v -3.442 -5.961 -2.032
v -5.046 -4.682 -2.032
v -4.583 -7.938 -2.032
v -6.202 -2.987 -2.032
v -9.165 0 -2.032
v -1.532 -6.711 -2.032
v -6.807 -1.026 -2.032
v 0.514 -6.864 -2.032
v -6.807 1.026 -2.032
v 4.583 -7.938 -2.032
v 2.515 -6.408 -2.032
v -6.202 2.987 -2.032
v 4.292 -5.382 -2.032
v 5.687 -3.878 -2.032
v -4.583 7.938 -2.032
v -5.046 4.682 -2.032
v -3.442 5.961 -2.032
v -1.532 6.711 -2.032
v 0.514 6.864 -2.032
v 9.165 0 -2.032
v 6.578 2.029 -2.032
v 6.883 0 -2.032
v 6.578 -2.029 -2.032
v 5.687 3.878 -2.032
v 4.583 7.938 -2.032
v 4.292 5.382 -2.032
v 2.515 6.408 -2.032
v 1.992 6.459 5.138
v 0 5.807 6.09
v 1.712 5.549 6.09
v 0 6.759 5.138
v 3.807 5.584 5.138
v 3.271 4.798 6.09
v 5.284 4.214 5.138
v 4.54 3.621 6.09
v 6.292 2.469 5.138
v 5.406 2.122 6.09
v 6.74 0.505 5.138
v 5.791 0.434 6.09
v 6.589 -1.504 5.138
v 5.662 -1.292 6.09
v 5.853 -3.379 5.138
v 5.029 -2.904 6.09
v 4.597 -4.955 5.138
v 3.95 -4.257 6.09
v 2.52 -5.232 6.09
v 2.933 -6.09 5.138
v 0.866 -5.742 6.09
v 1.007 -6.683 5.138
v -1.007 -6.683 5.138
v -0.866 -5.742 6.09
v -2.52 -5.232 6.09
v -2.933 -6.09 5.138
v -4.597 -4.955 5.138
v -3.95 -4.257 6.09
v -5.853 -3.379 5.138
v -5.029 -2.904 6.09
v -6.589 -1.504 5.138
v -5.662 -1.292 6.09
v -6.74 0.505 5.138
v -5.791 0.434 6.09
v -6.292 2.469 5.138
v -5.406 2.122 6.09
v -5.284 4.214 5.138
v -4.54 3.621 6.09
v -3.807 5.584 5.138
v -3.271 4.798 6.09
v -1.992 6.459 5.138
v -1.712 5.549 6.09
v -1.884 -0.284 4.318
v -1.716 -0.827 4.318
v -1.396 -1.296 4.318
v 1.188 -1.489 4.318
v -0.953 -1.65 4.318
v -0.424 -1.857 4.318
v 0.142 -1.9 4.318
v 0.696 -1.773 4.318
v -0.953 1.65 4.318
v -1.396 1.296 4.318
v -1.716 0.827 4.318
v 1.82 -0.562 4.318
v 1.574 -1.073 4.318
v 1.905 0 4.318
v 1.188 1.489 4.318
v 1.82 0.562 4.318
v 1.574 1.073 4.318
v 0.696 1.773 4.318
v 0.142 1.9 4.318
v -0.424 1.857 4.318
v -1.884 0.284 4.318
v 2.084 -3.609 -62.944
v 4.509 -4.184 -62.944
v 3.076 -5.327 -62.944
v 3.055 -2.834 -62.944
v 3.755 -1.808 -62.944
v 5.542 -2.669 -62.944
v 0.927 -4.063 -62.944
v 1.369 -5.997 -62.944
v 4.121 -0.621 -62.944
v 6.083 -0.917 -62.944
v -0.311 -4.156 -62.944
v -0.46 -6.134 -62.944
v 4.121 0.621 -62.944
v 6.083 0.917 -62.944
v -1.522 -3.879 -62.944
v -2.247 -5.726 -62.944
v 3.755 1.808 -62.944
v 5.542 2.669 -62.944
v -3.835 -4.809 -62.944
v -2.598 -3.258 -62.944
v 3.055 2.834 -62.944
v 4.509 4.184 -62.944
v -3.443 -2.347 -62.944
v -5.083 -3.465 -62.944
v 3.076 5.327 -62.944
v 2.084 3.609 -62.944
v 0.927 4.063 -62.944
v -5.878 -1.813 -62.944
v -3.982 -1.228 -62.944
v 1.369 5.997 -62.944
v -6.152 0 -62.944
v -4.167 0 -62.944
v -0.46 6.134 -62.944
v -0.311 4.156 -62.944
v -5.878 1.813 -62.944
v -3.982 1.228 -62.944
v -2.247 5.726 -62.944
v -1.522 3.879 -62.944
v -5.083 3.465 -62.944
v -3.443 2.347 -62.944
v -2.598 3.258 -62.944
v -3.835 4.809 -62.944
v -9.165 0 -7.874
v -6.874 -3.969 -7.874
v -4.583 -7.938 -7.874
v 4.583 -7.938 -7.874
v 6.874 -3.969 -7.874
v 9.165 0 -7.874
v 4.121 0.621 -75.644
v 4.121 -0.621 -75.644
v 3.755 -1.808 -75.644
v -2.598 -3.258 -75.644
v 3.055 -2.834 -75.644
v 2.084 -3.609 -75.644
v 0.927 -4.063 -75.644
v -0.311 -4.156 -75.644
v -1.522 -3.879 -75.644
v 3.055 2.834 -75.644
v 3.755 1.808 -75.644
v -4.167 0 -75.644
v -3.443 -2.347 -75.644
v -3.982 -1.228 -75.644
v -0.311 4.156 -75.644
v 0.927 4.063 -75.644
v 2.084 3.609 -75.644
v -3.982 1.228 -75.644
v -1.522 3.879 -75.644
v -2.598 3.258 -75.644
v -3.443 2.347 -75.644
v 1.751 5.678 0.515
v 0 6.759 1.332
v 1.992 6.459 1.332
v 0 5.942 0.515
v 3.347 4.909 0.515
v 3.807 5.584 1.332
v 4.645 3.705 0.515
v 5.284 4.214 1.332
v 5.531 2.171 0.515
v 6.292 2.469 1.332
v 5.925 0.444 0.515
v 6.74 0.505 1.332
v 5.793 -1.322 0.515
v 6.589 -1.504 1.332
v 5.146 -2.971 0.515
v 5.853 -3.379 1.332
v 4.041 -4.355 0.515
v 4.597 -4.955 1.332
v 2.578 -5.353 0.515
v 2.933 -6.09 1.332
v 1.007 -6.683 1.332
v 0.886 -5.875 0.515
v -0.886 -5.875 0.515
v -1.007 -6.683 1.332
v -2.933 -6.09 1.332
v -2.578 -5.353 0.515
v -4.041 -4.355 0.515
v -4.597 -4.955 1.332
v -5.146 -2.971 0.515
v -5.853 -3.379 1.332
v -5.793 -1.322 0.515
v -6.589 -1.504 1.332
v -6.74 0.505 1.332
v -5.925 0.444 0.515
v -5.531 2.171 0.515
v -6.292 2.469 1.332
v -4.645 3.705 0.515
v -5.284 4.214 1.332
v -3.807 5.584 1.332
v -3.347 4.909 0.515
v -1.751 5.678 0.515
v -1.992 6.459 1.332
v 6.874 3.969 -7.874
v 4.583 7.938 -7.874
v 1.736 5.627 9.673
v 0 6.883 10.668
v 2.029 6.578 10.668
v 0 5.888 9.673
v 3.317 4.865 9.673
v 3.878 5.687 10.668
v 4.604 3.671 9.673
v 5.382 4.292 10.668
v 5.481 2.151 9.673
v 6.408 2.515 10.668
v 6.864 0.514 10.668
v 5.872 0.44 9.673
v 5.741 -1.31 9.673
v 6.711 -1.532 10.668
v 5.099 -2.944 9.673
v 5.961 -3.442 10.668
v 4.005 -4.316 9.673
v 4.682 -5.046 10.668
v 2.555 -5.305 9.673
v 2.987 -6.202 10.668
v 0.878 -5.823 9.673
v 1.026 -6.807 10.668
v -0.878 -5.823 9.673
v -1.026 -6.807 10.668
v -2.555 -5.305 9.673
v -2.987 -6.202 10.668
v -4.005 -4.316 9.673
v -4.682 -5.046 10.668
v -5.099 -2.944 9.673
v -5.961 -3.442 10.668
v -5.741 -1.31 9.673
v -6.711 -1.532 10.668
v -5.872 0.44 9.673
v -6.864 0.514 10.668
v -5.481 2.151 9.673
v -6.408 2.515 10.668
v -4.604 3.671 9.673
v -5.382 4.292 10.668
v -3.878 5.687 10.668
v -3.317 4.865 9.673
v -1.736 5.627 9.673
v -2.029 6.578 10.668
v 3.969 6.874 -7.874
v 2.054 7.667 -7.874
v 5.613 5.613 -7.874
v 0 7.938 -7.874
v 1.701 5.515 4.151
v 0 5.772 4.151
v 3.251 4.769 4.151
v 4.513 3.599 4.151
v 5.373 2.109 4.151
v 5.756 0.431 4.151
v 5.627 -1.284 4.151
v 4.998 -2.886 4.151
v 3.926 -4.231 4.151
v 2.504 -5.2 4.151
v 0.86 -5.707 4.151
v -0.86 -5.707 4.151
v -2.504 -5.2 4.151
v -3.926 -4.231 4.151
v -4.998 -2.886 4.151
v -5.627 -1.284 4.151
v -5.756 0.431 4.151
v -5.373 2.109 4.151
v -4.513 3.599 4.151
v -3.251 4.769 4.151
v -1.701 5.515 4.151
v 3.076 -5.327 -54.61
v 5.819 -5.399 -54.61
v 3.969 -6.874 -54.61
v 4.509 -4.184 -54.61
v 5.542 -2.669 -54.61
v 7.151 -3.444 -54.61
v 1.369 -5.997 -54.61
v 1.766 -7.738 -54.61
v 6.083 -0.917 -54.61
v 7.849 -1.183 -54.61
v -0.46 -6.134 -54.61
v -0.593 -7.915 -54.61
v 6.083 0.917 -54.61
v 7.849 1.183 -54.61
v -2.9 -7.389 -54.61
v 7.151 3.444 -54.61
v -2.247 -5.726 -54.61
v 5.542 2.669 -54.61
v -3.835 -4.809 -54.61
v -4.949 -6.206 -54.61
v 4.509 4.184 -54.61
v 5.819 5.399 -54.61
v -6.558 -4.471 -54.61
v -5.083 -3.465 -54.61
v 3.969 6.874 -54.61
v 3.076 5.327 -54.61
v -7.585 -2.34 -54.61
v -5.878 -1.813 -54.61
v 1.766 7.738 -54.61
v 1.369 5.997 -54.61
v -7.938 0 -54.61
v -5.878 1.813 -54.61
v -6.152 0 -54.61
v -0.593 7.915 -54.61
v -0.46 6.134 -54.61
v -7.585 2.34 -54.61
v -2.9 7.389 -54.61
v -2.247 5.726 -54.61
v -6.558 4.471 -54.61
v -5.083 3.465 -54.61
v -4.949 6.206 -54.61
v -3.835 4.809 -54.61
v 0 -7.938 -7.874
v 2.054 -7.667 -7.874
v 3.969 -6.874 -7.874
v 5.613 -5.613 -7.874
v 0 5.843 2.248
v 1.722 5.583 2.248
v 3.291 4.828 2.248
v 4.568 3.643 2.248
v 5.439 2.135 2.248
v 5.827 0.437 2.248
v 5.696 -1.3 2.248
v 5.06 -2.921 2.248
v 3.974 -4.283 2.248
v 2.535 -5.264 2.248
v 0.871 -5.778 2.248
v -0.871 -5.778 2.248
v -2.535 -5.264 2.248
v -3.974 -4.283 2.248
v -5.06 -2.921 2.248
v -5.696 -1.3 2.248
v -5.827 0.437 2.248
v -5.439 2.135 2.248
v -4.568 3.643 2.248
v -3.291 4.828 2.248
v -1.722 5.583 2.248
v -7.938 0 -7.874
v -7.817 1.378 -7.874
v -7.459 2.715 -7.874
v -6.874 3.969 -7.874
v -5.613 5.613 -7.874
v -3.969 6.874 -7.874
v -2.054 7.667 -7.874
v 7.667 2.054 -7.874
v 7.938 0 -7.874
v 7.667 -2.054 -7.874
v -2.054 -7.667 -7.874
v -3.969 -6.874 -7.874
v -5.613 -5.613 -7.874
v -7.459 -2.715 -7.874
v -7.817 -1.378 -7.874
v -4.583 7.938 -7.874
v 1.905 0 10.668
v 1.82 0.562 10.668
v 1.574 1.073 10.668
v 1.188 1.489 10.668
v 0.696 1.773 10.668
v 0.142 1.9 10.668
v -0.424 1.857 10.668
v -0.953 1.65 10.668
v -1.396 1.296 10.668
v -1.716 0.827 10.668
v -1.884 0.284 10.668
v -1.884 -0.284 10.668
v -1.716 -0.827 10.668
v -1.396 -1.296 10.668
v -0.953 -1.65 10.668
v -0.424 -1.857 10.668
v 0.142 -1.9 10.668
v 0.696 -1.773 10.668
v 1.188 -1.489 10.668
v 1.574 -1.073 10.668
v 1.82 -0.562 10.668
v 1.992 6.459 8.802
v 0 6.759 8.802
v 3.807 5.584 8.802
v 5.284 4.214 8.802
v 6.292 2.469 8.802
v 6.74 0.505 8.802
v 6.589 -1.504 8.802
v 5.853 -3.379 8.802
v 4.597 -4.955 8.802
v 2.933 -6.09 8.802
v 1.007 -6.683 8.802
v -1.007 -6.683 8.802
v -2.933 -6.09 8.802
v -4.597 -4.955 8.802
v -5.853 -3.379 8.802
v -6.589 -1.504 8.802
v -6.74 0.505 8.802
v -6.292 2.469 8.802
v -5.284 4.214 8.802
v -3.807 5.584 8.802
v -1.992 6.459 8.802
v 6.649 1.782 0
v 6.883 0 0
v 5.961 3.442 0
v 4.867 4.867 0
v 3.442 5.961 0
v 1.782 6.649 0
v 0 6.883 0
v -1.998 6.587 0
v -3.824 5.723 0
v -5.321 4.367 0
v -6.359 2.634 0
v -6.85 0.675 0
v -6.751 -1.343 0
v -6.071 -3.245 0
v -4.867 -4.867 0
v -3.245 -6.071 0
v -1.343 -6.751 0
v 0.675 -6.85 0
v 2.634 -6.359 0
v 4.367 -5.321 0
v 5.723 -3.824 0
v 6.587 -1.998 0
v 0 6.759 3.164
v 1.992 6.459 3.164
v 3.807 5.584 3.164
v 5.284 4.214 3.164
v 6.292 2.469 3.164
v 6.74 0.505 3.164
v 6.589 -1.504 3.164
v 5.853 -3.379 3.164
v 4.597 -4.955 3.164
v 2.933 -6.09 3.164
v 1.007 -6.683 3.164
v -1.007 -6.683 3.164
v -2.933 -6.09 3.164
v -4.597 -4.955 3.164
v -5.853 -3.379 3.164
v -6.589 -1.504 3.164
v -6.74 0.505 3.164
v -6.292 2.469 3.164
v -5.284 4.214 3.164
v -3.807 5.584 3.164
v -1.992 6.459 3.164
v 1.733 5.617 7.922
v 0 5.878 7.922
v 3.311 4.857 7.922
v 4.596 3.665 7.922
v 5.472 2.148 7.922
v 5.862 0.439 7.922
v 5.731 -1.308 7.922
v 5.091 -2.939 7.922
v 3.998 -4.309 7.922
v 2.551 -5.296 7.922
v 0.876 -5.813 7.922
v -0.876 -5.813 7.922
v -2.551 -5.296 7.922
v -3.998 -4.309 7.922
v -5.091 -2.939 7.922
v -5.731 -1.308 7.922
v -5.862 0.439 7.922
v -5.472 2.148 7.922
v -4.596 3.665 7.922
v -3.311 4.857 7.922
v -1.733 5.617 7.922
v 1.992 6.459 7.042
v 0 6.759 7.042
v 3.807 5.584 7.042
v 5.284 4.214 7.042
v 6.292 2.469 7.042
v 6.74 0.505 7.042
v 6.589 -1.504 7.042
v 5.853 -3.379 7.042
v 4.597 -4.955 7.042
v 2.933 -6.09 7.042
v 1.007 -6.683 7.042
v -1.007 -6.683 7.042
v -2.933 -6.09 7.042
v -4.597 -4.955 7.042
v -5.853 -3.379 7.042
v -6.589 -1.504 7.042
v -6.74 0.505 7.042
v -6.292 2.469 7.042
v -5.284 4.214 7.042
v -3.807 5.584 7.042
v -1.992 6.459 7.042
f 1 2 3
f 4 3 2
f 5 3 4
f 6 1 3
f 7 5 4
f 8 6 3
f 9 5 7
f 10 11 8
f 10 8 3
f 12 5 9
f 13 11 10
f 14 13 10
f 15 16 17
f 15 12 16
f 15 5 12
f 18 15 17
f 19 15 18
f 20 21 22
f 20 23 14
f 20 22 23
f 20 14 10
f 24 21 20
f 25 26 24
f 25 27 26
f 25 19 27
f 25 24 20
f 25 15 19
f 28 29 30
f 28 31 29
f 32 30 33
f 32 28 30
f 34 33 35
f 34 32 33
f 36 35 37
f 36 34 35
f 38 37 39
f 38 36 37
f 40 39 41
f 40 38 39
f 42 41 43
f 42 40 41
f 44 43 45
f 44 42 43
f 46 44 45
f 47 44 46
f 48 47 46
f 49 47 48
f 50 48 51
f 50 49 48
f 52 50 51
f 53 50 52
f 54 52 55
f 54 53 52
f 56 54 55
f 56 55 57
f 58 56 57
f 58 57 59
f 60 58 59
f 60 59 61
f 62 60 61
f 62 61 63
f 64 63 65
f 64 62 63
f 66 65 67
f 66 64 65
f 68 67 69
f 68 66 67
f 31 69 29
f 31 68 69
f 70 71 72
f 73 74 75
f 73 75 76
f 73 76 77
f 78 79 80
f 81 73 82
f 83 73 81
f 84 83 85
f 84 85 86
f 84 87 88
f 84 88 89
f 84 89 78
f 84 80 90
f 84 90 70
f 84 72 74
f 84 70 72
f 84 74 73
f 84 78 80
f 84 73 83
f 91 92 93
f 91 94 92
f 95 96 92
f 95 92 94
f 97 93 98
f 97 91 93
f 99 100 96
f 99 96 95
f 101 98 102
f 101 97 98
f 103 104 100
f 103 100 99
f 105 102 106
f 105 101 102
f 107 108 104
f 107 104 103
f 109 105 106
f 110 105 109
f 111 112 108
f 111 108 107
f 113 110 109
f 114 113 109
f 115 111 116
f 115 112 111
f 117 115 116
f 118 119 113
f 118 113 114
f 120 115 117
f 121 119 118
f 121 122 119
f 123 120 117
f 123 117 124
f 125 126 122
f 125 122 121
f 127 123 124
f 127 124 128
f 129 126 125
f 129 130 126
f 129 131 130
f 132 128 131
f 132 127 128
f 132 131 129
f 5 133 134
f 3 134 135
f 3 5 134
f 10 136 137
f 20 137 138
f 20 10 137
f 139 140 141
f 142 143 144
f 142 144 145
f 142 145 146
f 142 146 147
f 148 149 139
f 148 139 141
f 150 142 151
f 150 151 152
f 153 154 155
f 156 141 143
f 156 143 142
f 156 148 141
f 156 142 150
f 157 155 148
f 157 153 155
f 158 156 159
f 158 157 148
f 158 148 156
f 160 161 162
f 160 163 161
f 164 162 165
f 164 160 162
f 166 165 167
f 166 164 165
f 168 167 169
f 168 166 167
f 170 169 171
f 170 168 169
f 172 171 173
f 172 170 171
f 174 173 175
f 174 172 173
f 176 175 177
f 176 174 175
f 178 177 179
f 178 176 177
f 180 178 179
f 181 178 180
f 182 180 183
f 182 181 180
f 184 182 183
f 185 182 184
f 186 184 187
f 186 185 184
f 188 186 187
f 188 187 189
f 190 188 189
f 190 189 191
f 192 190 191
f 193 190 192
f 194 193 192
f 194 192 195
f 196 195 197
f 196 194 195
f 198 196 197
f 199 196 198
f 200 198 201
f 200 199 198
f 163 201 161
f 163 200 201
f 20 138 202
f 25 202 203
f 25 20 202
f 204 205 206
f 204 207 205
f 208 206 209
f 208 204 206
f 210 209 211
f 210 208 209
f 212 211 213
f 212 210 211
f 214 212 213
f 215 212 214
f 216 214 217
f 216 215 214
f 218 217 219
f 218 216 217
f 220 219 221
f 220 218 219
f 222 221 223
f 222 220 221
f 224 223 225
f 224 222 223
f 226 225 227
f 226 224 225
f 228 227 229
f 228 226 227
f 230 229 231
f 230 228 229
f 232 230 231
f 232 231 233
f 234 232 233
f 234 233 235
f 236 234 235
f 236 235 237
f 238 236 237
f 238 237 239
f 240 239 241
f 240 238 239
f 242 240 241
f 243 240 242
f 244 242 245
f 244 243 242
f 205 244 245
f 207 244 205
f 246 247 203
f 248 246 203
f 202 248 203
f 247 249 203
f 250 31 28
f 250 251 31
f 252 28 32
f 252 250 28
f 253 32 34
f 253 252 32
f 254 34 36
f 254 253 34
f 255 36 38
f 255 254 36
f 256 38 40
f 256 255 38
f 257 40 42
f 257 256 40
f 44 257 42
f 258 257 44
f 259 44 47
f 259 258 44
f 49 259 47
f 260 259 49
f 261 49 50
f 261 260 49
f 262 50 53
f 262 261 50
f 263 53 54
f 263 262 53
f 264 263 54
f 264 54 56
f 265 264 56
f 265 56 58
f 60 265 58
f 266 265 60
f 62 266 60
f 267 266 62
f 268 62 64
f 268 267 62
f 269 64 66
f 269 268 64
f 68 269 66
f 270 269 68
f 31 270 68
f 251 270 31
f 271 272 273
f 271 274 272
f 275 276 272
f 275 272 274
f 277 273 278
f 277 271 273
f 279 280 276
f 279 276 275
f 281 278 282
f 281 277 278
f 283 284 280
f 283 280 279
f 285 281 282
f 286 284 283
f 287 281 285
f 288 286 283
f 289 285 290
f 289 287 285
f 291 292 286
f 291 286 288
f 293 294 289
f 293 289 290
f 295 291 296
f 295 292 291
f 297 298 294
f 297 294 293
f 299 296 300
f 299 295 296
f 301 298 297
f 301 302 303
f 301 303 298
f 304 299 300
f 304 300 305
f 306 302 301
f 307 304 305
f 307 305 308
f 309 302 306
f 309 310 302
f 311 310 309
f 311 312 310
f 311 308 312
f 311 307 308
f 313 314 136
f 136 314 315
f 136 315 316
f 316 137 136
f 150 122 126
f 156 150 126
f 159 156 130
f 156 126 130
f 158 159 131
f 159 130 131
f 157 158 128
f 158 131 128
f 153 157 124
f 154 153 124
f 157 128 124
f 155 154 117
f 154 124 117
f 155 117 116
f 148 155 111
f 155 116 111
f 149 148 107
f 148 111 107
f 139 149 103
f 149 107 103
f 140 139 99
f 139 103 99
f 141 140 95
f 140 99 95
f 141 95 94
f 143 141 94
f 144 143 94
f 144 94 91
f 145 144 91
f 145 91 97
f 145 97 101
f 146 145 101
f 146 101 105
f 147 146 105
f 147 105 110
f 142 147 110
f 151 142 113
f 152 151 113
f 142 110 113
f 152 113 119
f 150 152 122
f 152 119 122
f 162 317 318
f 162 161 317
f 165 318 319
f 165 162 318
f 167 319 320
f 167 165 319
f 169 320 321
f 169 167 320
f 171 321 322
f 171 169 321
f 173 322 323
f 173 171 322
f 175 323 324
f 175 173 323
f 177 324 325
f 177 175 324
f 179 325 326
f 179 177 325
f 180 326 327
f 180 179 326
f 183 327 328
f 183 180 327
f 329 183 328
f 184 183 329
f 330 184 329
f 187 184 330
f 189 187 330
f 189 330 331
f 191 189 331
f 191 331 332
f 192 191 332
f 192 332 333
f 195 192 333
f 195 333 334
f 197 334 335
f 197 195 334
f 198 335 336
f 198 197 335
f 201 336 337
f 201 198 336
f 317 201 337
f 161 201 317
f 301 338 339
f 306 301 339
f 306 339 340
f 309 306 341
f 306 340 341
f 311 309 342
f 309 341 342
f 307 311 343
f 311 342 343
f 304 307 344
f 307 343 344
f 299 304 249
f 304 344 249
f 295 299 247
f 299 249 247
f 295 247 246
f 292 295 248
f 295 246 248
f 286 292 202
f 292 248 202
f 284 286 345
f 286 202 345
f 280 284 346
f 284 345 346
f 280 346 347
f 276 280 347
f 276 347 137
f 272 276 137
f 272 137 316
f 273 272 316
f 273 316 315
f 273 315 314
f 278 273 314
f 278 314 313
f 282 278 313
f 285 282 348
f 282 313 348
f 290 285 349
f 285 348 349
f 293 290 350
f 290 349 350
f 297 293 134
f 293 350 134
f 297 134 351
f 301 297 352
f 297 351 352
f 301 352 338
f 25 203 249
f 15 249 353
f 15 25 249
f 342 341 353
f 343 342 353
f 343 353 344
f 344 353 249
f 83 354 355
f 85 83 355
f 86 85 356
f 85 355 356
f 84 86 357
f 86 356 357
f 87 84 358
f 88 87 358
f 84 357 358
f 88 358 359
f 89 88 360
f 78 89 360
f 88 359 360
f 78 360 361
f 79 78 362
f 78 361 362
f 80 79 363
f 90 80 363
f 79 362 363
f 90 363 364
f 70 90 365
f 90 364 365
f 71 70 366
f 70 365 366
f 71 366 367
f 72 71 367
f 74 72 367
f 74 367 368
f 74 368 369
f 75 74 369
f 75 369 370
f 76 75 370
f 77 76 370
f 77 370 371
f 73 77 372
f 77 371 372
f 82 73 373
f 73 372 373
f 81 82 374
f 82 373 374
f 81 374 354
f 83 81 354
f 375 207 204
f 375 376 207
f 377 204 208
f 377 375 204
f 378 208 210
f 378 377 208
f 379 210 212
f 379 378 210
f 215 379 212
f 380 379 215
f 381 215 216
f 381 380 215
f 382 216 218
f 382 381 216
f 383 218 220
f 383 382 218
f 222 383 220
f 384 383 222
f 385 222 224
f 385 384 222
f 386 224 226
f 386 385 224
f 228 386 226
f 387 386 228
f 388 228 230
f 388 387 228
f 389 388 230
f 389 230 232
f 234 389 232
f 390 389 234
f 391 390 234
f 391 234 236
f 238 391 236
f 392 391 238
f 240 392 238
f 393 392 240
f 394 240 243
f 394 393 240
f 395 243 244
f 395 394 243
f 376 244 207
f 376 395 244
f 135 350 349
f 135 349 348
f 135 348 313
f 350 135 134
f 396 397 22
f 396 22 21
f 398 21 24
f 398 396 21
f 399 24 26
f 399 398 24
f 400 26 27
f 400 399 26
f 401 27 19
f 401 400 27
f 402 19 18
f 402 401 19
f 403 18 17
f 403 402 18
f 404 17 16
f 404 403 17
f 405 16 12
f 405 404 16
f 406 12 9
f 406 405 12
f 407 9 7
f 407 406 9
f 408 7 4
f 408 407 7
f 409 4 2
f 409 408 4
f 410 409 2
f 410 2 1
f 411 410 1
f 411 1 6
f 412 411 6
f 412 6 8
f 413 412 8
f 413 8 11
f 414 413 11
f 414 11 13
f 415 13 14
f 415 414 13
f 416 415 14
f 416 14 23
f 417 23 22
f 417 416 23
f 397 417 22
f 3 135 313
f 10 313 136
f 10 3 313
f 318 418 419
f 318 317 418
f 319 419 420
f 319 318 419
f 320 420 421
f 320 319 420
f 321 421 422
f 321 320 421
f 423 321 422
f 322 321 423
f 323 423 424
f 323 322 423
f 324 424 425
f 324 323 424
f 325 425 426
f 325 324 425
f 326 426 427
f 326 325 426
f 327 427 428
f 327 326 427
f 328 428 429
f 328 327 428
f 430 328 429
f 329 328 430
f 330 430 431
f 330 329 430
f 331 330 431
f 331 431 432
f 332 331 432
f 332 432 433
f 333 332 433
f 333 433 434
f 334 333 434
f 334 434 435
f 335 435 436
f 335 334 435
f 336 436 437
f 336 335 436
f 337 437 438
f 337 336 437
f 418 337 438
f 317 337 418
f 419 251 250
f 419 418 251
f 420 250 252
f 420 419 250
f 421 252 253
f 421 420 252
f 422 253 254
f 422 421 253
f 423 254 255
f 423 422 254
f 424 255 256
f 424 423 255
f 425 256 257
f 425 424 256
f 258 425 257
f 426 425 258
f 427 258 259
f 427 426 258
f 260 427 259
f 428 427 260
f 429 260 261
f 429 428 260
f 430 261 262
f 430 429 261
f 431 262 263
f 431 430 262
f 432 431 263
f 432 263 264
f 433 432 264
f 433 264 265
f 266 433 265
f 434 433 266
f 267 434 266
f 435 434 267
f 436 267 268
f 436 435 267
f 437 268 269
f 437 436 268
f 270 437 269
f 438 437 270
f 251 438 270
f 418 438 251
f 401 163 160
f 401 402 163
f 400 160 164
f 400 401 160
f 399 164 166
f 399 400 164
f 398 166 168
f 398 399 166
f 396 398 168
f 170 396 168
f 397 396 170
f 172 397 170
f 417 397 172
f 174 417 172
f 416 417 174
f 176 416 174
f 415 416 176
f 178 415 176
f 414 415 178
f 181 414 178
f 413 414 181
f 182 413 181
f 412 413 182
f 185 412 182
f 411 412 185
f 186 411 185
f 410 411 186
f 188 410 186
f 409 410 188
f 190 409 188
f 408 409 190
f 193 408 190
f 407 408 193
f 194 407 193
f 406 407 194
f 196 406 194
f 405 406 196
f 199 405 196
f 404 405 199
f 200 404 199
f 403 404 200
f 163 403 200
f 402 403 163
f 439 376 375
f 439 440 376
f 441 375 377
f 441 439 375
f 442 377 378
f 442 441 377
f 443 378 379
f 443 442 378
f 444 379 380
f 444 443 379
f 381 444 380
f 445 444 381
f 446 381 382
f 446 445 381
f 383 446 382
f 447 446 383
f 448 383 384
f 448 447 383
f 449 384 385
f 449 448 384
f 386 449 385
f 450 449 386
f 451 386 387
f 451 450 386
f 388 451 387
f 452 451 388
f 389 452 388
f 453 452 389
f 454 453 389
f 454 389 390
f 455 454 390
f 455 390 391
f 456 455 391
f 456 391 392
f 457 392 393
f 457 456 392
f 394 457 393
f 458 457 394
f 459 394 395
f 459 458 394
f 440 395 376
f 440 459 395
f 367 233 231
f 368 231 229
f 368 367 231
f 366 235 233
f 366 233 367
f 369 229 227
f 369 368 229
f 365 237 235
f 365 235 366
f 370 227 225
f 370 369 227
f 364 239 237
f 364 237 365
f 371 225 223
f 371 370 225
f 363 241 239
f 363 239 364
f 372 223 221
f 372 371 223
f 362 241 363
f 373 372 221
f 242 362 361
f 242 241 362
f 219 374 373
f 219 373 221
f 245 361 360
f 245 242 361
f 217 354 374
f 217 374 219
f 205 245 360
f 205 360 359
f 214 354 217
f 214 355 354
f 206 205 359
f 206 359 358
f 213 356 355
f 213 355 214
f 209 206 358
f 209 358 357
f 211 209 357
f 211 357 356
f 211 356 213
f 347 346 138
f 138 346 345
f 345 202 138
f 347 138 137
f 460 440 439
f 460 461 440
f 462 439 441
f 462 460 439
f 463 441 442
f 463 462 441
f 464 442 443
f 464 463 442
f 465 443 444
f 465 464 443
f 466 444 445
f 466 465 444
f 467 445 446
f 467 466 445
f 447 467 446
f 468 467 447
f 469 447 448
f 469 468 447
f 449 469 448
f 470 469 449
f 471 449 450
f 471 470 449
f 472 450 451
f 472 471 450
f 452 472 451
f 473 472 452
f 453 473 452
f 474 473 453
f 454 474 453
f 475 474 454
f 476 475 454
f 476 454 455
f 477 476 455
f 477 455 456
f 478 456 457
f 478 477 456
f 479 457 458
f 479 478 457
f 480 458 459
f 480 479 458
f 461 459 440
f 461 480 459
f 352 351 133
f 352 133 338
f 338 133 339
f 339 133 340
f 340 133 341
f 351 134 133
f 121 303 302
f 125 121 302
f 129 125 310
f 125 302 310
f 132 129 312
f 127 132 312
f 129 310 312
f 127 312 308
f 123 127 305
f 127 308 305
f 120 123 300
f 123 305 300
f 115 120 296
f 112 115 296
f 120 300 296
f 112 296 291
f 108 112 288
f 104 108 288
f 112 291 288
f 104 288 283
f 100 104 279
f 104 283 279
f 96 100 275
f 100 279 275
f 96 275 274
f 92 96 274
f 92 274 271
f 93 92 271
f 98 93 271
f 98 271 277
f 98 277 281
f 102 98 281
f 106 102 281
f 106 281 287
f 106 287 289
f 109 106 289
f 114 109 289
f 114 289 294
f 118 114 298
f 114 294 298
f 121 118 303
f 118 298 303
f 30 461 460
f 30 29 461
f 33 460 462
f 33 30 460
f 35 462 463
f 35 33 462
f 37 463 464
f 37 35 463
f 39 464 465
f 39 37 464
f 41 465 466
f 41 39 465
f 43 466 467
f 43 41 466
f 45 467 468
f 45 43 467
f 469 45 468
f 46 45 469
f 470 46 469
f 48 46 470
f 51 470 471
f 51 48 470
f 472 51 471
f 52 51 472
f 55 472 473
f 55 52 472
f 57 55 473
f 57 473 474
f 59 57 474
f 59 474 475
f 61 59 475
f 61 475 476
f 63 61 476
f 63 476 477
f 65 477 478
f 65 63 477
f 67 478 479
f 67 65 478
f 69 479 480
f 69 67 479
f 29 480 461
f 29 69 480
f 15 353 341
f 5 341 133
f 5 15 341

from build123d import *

# Parameters (mm, degrees)
SKETCH1_R          = 6.8834
EXTRUDE1_DEPTH     = 10.668
SKETCH1_2_R        = 6.8834
EXTRUDE2_DEPTH     = 2.032
SKETCH3_R          = 1.905
CUT_EXTRUDE1_DEPTH = 6.35
EXTRUDE3_DEPTH     = 5.842
SKETCH5_R          = 7.9375
EXTRUDE4_DEPTH     = 46.736
SKETCH6_R          = 6.1515625
EXTRUDE5_DEPTH     = 8.334375
SKETCH7_R          = 4.1671875
EXTRUDE6_DEPTH     = 12.7


with BuildPart() as part:
    # Sketch1 → Extrude1 (new body)
    with BuildSketch(Plane.XY):
        Circle(SKETCH1_R)
    extrude(amount=EXTRUDE1_DEPTH)

    # Sketch2 → Cut-Revolve5 (revolve, cut)
    with BuildSketch(Plane(origin=(0, 0, 0), x_dir=(0, 0, -1), z_dir=(1, 0, 0))):
        Polygon((-10.668, 6.8834), (-9.672936951, 5.888336951), (-8.802379845, 6.758894057), (-7.921944961, 5.878459173), (-7.041510078, 6.758894057), (-6.089928941, 5.80731292), (-5.138347804, 6.758894057), (-4.15119354, 5.771739793), (-3.164039276, 6.758894057), (-2.248031266, 5.842886047), (-1.332023256, 6.758894057), (-0.514702762, 5.941573563), (0, 6.8834), align=None)
    revolve(axis=Axis((0, 0, 12.00396124), (0, 0, -1)), mode=Mode.SUBTRACT)

    # Sketch1<2> → Extrude2 (add)
    with BuildSketch(Plane.XY):
        Circle(SKETCH1_2_R)
    extrude(amount=-EXTRUDE2_DEPTH)

    # Sketch3 → Cut-Extrude1 (cut)
    with BuildSketch(Plane.XY.offset(10.668)):
        Circle(SKETCH3_R)
    extrude(amount=-CUT_EXTRUDE1_DEPTH, mode=Mode.SUBTRACT)

    # Sketch4 → Extrude3 (add)
    with BuildSketch(Plane(origin=(0, 0, -2.032), x_dir=(-1, 0, 0), z_dir=(0, 0, -1))):
        Polygon((-4.582717762, 7.9375), (4.582717762, 7.9375), (9.165435523, 0), (4.582717762, -7.9375), (-4.582717762, -7.9375), (-9.165435523, 0), align=None)
    extrude(amount=EXTRUDE3_DEPTH)

    # Sketch5 → Extrude4 (add)
    with BuildSketch(Plane(origin=(0, 0, -7.874), x_dir=(-1, 0, 0), z_dir=(0, 0, -1))):
        Circle(SKETCH5_R)
    extrude(amount=EXTRUDE4_DEPTH)

    # Sketch6 → Extrude5 (add)
    with BuildSketch(Plane(origin=(0, 0, -54.61), x_dir=(-1, 0, 0), z_dir=(0, 0, -1))):
        Circle(SKETCH6_R)
    extrude(amount=EXTRUDE5_DEPTH)

    # Sketch7 → Extrude6 (add)
    with BuildSketch(Plane(origin=(0, 0, -62.944375), x_dir=(-1, 0, 0), z_dir=(0, 0, -1))):
        Circle(SKETCH7_R)
    extrude(amount=EXTRUDE6_DEPTH)


solid = part.part
